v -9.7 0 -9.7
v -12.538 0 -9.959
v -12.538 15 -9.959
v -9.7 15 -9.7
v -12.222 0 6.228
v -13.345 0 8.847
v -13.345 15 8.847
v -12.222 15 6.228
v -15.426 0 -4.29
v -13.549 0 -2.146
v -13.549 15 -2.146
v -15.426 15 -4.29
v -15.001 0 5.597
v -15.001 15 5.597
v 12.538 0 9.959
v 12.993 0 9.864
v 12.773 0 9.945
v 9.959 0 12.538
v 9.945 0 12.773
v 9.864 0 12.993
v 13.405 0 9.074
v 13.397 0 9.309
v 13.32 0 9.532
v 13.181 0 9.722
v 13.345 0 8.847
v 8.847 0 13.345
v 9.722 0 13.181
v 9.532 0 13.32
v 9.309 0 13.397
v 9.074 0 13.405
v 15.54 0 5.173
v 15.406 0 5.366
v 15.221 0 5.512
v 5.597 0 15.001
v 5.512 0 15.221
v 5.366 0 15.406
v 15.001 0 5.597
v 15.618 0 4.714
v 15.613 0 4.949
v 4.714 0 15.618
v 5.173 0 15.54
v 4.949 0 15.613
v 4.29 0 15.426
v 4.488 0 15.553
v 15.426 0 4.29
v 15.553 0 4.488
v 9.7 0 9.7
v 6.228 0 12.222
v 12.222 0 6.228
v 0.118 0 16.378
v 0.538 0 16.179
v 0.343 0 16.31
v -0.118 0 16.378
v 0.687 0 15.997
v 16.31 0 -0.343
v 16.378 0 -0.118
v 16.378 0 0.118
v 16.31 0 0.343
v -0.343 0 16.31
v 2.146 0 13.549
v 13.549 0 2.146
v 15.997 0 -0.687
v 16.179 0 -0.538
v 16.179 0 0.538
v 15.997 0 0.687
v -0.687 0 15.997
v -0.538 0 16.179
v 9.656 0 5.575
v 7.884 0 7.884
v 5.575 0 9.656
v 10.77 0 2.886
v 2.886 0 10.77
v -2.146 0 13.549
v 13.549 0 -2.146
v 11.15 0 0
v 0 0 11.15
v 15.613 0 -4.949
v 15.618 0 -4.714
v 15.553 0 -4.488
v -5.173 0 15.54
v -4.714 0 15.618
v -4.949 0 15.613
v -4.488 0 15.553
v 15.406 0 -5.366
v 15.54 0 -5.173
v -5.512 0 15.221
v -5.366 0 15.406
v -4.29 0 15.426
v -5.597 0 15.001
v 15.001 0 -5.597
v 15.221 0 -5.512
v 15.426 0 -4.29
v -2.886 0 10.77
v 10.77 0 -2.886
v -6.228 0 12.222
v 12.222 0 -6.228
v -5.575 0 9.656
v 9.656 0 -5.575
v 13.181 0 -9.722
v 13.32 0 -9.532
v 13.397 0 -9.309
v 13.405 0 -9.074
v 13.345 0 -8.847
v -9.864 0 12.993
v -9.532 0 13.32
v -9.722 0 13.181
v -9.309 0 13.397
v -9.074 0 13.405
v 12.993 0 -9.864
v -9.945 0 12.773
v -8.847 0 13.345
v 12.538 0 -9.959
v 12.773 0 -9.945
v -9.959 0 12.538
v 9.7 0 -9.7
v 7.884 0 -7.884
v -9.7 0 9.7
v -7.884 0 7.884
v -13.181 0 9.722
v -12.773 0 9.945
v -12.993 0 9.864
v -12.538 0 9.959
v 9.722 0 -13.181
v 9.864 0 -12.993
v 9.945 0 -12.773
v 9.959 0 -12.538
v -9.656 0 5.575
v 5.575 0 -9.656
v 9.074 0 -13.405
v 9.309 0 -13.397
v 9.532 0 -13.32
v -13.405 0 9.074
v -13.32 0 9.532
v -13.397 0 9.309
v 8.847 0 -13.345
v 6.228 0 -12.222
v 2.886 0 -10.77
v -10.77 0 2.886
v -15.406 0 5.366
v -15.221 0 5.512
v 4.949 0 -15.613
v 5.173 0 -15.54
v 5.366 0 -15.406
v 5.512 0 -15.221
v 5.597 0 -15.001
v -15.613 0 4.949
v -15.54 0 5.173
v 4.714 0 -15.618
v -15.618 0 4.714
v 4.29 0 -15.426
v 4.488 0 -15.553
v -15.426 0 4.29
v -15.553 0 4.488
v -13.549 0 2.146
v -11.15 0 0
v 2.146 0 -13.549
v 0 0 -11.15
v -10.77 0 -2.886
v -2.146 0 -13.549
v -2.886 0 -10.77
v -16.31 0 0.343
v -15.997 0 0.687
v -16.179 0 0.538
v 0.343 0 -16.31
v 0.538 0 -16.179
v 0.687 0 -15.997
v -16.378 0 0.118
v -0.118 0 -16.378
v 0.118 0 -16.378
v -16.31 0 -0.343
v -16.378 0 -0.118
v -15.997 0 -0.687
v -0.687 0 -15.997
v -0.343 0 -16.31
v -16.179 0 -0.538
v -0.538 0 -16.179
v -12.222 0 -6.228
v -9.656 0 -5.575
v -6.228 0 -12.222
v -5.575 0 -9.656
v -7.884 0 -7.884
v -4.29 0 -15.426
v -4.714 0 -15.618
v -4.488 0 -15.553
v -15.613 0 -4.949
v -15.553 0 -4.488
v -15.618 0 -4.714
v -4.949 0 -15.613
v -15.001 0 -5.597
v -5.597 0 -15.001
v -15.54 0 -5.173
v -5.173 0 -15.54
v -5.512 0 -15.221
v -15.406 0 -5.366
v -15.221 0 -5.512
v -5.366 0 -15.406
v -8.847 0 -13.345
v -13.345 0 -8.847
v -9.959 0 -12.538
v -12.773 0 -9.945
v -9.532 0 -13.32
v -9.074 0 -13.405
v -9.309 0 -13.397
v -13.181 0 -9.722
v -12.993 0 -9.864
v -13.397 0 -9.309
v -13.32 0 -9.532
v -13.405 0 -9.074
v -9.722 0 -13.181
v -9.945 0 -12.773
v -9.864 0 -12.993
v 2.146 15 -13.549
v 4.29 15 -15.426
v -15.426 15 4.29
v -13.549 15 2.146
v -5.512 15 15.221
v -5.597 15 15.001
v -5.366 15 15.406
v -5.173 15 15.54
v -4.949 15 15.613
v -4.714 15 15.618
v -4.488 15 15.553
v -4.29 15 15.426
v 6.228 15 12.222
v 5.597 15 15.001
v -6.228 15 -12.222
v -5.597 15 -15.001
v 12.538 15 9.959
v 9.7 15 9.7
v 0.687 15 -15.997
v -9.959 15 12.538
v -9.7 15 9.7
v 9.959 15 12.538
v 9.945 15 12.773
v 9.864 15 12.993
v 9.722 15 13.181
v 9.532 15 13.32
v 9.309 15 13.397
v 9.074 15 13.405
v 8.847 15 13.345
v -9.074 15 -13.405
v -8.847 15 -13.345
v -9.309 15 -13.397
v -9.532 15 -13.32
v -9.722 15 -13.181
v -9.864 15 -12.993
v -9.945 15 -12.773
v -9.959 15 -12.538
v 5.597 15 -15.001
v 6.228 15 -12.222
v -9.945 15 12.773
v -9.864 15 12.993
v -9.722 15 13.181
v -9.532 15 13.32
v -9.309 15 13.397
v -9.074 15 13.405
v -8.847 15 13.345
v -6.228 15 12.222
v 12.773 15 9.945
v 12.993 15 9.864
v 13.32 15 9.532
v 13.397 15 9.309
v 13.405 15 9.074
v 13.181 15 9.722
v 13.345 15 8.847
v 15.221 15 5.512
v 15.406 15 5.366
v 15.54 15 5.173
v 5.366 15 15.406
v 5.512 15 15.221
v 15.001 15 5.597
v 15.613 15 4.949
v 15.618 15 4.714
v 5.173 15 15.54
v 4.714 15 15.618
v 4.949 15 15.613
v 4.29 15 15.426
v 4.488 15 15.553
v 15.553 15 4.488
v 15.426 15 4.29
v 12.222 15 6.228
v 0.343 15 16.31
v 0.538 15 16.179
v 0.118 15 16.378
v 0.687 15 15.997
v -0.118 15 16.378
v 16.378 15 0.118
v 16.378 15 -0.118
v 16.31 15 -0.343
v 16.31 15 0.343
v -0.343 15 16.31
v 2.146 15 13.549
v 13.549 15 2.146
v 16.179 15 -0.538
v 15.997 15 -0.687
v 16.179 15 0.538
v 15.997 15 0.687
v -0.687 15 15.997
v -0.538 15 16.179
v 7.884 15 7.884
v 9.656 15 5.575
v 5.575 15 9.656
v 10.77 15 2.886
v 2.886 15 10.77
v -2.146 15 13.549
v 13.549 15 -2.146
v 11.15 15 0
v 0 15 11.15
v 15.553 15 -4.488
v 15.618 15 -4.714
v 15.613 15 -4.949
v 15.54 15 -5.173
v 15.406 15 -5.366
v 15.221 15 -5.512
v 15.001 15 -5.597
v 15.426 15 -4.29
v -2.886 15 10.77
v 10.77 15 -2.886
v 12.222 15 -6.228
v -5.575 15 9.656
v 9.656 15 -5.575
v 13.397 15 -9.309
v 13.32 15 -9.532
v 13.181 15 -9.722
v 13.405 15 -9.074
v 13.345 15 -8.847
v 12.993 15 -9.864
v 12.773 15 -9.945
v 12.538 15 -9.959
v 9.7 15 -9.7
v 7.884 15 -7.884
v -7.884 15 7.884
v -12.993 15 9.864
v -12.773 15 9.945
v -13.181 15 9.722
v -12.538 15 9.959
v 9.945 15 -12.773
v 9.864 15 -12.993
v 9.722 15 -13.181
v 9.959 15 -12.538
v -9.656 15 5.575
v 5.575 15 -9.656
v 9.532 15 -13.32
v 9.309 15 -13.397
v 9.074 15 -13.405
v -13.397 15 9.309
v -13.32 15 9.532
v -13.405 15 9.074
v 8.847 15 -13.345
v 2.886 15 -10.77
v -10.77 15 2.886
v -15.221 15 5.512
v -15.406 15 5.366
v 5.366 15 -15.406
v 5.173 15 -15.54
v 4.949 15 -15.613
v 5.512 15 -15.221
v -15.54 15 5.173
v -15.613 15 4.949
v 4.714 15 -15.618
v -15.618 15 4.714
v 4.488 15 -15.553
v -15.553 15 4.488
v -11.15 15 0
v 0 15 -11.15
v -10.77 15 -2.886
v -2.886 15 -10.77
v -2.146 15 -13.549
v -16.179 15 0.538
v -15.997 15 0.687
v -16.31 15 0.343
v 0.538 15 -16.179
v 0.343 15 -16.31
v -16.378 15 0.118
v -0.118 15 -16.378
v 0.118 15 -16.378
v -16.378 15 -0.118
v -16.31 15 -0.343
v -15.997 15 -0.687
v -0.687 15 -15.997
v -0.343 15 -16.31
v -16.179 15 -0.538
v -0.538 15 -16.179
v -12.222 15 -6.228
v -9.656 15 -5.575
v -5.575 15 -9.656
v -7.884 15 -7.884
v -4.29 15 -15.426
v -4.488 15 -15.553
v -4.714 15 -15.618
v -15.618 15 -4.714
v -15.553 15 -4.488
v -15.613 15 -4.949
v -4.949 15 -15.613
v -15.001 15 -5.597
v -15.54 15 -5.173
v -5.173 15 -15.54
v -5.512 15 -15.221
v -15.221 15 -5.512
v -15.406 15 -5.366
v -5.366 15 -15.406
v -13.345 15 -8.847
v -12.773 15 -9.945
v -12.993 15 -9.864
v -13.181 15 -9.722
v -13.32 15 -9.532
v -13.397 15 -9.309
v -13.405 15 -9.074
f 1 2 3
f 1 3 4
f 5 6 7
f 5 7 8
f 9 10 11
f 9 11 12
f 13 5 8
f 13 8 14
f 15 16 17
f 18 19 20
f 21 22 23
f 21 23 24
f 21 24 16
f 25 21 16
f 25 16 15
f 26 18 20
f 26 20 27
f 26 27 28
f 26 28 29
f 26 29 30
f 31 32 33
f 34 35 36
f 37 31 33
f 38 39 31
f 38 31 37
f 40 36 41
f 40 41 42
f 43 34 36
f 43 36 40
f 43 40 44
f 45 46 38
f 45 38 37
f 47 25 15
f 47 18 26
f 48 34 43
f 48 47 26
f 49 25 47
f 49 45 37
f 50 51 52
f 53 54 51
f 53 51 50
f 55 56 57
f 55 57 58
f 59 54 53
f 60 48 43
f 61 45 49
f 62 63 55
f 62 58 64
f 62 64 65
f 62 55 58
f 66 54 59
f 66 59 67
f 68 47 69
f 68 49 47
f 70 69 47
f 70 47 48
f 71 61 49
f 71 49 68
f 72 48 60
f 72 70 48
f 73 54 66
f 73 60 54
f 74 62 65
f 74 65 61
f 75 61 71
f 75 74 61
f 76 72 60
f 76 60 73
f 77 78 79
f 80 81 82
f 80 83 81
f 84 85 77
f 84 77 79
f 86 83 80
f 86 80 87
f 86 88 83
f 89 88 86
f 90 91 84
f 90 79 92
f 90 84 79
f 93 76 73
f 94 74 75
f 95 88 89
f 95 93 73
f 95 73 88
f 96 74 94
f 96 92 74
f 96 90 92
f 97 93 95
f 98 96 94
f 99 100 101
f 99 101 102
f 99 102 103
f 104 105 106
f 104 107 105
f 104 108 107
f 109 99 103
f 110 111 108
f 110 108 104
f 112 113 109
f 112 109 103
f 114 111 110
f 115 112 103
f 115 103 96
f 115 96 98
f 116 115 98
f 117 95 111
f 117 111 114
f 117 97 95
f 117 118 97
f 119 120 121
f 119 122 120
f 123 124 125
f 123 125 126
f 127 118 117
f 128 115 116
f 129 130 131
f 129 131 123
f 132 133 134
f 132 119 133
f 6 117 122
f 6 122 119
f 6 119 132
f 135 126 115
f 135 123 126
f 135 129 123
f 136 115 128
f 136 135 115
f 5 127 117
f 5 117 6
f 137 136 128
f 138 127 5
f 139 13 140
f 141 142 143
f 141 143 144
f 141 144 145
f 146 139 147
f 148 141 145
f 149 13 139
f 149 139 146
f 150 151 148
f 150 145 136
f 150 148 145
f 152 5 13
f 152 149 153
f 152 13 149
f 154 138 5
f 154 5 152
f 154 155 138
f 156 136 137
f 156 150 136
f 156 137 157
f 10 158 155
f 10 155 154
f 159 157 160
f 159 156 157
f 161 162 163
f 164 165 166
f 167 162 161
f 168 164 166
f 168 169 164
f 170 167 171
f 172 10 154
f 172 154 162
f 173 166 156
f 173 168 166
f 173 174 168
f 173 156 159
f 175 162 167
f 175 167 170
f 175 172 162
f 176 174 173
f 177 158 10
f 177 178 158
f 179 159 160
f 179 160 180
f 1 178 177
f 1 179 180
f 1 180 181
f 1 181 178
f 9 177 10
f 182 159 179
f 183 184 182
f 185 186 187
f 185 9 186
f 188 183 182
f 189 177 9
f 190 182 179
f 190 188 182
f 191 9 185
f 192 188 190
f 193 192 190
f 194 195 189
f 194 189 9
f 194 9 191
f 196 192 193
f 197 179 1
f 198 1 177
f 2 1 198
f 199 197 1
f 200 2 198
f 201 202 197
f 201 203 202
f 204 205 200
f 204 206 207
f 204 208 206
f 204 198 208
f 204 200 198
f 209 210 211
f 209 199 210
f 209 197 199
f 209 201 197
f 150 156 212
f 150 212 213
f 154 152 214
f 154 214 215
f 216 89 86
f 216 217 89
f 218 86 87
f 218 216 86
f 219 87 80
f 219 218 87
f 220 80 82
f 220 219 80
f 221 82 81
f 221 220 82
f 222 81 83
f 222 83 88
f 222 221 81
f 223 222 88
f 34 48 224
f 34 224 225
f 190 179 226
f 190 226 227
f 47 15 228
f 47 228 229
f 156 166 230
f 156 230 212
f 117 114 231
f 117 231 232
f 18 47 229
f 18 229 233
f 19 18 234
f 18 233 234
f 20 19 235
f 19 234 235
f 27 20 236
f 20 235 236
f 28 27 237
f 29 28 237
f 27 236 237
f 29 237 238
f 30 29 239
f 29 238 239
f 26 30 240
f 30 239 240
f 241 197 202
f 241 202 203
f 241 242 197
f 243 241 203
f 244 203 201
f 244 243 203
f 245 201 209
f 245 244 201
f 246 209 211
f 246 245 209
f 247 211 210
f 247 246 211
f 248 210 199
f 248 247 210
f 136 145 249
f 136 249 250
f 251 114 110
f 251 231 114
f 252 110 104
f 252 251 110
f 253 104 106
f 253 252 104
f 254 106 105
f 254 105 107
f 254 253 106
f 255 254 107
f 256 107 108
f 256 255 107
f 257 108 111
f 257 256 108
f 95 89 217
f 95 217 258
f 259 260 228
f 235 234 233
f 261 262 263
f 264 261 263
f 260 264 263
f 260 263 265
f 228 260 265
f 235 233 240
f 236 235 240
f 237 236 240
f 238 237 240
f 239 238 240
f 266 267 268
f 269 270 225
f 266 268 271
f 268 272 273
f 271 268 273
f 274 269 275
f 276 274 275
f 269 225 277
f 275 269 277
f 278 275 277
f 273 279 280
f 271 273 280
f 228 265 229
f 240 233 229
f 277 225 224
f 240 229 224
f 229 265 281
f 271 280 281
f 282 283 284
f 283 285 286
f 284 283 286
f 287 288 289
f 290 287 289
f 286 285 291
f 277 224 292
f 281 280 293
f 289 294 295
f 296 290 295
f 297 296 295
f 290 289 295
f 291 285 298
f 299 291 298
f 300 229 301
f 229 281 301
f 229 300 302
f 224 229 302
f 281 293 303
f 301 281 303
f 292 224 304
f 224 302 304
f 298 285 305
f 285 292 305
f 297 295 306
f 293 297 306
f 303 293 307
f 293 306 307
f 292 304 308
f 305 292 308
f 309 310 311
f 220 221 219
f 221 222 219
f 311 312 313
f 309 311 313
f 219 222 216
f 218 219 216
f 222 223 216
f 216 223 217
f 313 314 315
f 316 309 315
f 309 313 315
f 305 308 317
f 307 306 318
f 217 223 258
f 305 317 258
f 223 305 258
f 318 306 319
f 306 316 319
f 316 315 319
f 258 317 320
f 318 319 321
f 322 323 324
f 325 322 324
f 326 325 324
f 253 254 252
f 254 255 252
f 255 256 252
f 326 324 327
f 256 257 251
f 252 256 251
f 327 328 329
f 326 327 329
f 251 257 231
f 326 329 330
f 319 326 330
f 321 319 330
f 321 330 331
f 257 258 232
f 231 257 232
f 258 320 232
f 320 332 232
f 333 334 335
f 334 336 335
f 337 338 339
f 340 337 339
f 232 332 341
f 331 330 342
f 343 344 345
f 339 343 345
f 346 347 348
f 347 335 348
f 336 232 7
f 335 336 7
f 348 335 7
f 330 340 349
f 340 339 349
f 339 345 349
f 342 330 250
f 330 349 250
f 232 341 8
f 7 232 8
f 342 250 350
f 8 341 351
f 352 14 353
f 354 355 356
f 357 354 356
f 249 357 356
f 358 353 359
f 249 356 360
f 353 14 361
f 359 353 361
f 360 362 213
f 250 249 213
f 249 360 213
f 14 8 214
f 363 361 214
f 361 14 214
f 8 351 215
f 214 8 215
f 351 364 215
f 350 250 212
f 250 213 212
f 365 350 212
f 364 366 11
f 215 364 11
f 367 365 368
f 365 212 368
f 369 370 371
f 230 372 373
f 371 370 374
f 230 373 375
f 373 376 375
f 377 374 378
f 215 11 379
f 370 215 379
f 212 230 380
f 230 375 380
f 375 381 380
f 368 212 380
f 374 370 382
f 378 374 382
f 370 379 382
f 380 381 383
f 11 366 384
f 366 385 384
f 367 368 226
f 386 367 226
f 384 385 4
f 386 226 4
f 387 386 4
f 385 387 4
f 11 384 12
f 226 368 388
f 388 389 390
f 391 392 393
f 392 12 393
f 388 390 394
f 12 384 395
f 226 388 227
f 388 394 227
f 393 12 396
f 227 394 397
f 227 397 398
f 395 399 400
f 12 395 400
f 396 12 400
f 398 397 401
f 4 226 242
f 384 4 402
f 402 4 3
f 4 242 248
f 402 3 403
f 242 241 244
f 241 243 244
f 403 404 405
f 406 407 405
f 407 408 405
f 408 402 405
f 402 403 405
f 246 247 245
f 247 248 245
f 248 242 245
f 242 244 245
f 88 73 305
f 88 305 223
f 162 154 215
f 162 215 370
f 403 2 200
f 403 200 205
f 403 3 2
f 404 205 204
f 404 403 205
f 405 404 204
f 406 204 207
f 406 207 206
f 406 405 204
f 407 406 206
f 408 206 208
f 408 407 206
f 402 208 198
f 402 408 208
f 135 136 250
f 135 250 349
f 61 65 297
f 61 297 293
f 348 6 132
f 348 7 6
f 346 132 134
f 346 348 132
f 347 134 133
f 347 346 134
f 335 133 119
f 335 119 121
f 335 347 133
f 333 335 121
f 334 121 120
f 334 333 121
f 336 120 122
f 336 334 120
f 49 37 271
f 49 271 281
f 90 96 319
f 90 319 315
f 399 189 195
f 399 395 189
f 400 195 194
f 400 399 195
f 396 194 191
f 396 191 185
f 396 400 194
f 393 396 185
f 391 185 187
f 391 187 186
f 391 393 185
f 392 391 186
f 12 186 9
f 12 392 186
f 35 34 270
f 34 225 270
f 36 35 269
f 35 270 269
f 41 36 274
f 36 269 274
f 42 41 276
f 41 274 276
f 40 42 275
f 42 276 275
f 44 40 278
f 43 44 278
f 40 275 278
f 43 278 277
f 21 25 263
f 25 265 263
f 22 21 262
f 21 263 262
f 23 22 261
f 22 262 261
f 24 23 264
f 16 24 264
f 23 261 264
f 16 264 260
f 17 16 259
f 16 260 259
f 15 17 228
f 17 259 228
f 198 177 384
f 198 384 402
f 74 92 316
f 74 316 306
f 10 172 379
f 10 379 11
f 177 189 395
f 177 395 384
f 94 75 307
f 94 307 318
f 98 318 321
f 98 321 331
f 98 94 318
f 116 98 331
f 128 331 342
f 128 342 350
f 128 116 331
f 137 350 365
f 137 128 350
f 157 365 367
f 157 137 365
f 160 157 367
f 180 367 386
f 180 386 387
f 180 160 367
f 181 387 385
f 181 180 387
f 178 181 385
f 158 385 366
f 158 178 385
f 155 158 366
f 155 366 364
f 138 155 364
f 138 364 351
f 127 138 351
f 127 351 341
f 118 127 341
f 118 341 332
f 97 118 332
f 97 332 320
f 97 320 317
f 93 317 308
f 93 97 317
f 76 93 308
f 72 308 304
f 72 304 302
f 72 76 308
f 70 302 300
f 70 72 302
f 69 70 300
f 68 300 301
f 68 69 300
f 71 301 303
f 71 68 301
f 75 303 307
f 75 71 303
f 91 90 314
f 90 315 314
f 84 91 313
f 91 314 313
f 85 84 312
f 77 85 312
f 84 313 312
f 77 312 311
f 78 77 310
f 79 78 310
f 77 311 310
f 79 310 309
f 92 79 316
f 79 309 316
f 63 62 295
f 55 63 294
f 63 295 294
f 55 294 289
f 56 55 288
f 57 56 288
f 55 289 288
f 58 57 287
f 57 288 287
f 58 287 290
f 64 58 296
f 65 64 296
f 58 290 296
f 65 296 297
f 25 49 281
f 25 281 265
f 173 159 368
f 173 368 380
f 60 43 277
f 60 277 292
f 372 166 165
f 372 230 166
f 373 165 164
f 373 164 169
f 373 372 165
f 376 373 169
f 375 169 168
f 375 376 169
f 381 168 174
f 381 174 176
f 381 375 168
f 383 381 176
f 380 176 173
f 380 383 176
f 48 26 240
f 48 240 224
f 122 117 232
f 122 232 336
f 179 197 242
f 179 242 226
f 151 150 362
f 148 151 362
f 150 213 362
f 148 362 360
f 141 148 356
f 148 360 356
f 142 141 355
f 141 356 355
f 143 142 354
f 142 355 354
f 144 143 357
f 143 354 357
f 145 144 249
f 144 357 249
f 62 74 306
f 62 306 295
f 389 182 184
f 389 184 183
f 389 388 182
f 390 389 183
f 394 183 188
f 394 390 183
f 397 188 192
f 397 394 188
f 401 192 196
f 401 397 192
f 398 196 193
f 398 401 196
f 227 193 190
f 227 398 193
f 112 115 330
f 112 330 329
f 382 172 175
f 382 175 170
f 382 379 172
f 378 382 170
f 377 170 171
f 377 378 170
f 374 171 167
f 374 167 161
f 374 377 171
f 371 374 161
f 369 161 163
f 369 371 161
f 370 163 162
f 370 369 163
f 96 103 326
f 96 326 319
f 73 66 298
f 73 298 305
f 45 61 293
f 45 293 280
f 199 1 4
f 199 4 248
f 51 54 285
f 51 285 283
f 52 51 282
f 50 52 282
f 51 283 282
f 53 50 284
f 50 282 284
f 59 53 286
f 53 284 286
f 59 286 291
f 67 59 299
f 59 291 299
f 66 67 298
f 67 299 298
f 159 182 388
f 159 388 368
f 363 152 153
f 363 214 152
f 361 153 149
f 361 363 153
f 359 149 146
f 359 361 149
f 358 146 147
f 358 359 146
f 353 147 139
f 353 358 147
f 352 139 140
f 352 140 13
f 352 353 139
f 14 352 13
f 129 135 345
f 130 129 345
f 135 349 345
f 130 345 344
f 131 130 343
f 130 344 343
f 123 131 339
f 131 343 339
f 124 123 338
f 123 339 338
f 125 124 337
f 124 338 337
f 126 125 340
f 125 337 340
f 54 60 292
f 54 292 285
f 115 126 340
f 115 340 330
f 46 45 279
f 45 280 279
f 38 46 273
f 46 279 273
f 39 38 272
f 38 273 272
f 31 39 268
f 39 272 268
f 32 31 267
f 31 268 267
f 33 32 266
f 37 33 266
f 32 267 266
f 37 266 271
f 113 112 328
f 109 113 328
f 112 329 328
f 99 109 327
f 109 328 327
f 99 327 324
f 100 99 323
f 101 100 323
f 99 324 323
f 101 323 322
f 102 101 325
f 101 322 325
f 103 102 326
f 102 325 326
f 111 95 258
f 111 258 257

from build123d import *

# Parameters (mm, degrees)
SKETCH1_R           = 11.15
BOSS_EXTRUDE1_DEPTH = 15
FILLET3_R           = 0.8


with BuildPart() as part:
    # Sketch1 → Boss-Extrude1 (new body)
    with BuildSketch(Plane(origin=(0, 0, 0), x_dir=(1, 0, 0), z_dir=(0, 1, 0))):
        Polygon((0, 17.15), (2.145893606, 13.548639006), (5.299641454, 16.310619254), (6.227625801, 12.222403821), (10.080517077, 13.874641454), (9.699754592, 9.699754592), (13.874641454, 10.080517077), (12.222403821, 6.227625801), (16.310619254, 5.299641454), (13.548639006, 2.145893606), (17.15, 0), (13.548639006, -2.145893606), (16.310619254, -5.299641454), (12.222403821, -6.227625801), (13.874641454, -10.080517077), (9.699754592, -9.699754592), (10.080517077, -13.874641454), (6.227625801, -12.222403821), (5.299641454, -16.310619254), (2.145893606, -13.548639006), (0, -17.15), (-2.145893606, -13.548639006), (-5.299641454, -16.310619254), (-6.227625801, -12.222403821), (-10.080517077, -13.874641454), (-9.699754592, -9.699754592), (-13.874641454, -10.080517077), (-12.222403821, -6.227625801), (-16.310619254, -5.299641454), (-13.548639006, -2.145893606), (-17.15, 0), (-13.548639006, 2.145893606), (-16.310619254, 5.299641454), (-12.222403821, 6.227625801), (-13.874641454, 10.080517077), (-9.699754592, 9.699754592), (-10.080517077, 13.874641454), (-6.227625801, 12.222403821), (-5.299641454, 16.310619254), (-2.145893606, 13.548639006), align=None)
        Circle(SKETCH1_R, mode=Mode.SUBTRACT)
    extrude(amount=BOSS_EXTRUDE1_DEPTH)

    # Fillet3
    fillet3_edges = [part.edges().sort_by_distance(p)[0] for p in [
        (0, 7.5, -17.15),
        (5.299641454, 7.5, -16.310619254),
        (10.080517077, 7.5, -13.874641454),
        (13.874641454, 7.5, -10.080517077),
        (16.310619254, 7.5, -5.299641454),
        (17.15, 7.5, 0),
        (16.310619254, 7.5, 5.299641454),
        (13.874641454, 7.5, 10.080517077),
        (10.080517077, 7.5, 13.874641454),
        (5.299641454, 7.5, 16.310619254),
        (0, 7.5, 17.15),
        (-5.299641454, 7.5, 16.310619254),
        (-10.080517077, 7.5, 13.874641454),
        (-13.874641454, 7.5, 10.080517077),
        (-16.310619254, 7.5, 5.299641454),
        (-17.15, 7.5, 0),
        (-16.310619254, 7.5, -5.299641454),
        (-13.874641454, 7.5, -10.080517077),
        (-10.080517077, 7.5, -13.874641454),
        (-5.299641454, 7.5, -16.310619254),
    ]]
    fillet(fillet3_edges, radius=FILLET3_R)


solid = part.part
